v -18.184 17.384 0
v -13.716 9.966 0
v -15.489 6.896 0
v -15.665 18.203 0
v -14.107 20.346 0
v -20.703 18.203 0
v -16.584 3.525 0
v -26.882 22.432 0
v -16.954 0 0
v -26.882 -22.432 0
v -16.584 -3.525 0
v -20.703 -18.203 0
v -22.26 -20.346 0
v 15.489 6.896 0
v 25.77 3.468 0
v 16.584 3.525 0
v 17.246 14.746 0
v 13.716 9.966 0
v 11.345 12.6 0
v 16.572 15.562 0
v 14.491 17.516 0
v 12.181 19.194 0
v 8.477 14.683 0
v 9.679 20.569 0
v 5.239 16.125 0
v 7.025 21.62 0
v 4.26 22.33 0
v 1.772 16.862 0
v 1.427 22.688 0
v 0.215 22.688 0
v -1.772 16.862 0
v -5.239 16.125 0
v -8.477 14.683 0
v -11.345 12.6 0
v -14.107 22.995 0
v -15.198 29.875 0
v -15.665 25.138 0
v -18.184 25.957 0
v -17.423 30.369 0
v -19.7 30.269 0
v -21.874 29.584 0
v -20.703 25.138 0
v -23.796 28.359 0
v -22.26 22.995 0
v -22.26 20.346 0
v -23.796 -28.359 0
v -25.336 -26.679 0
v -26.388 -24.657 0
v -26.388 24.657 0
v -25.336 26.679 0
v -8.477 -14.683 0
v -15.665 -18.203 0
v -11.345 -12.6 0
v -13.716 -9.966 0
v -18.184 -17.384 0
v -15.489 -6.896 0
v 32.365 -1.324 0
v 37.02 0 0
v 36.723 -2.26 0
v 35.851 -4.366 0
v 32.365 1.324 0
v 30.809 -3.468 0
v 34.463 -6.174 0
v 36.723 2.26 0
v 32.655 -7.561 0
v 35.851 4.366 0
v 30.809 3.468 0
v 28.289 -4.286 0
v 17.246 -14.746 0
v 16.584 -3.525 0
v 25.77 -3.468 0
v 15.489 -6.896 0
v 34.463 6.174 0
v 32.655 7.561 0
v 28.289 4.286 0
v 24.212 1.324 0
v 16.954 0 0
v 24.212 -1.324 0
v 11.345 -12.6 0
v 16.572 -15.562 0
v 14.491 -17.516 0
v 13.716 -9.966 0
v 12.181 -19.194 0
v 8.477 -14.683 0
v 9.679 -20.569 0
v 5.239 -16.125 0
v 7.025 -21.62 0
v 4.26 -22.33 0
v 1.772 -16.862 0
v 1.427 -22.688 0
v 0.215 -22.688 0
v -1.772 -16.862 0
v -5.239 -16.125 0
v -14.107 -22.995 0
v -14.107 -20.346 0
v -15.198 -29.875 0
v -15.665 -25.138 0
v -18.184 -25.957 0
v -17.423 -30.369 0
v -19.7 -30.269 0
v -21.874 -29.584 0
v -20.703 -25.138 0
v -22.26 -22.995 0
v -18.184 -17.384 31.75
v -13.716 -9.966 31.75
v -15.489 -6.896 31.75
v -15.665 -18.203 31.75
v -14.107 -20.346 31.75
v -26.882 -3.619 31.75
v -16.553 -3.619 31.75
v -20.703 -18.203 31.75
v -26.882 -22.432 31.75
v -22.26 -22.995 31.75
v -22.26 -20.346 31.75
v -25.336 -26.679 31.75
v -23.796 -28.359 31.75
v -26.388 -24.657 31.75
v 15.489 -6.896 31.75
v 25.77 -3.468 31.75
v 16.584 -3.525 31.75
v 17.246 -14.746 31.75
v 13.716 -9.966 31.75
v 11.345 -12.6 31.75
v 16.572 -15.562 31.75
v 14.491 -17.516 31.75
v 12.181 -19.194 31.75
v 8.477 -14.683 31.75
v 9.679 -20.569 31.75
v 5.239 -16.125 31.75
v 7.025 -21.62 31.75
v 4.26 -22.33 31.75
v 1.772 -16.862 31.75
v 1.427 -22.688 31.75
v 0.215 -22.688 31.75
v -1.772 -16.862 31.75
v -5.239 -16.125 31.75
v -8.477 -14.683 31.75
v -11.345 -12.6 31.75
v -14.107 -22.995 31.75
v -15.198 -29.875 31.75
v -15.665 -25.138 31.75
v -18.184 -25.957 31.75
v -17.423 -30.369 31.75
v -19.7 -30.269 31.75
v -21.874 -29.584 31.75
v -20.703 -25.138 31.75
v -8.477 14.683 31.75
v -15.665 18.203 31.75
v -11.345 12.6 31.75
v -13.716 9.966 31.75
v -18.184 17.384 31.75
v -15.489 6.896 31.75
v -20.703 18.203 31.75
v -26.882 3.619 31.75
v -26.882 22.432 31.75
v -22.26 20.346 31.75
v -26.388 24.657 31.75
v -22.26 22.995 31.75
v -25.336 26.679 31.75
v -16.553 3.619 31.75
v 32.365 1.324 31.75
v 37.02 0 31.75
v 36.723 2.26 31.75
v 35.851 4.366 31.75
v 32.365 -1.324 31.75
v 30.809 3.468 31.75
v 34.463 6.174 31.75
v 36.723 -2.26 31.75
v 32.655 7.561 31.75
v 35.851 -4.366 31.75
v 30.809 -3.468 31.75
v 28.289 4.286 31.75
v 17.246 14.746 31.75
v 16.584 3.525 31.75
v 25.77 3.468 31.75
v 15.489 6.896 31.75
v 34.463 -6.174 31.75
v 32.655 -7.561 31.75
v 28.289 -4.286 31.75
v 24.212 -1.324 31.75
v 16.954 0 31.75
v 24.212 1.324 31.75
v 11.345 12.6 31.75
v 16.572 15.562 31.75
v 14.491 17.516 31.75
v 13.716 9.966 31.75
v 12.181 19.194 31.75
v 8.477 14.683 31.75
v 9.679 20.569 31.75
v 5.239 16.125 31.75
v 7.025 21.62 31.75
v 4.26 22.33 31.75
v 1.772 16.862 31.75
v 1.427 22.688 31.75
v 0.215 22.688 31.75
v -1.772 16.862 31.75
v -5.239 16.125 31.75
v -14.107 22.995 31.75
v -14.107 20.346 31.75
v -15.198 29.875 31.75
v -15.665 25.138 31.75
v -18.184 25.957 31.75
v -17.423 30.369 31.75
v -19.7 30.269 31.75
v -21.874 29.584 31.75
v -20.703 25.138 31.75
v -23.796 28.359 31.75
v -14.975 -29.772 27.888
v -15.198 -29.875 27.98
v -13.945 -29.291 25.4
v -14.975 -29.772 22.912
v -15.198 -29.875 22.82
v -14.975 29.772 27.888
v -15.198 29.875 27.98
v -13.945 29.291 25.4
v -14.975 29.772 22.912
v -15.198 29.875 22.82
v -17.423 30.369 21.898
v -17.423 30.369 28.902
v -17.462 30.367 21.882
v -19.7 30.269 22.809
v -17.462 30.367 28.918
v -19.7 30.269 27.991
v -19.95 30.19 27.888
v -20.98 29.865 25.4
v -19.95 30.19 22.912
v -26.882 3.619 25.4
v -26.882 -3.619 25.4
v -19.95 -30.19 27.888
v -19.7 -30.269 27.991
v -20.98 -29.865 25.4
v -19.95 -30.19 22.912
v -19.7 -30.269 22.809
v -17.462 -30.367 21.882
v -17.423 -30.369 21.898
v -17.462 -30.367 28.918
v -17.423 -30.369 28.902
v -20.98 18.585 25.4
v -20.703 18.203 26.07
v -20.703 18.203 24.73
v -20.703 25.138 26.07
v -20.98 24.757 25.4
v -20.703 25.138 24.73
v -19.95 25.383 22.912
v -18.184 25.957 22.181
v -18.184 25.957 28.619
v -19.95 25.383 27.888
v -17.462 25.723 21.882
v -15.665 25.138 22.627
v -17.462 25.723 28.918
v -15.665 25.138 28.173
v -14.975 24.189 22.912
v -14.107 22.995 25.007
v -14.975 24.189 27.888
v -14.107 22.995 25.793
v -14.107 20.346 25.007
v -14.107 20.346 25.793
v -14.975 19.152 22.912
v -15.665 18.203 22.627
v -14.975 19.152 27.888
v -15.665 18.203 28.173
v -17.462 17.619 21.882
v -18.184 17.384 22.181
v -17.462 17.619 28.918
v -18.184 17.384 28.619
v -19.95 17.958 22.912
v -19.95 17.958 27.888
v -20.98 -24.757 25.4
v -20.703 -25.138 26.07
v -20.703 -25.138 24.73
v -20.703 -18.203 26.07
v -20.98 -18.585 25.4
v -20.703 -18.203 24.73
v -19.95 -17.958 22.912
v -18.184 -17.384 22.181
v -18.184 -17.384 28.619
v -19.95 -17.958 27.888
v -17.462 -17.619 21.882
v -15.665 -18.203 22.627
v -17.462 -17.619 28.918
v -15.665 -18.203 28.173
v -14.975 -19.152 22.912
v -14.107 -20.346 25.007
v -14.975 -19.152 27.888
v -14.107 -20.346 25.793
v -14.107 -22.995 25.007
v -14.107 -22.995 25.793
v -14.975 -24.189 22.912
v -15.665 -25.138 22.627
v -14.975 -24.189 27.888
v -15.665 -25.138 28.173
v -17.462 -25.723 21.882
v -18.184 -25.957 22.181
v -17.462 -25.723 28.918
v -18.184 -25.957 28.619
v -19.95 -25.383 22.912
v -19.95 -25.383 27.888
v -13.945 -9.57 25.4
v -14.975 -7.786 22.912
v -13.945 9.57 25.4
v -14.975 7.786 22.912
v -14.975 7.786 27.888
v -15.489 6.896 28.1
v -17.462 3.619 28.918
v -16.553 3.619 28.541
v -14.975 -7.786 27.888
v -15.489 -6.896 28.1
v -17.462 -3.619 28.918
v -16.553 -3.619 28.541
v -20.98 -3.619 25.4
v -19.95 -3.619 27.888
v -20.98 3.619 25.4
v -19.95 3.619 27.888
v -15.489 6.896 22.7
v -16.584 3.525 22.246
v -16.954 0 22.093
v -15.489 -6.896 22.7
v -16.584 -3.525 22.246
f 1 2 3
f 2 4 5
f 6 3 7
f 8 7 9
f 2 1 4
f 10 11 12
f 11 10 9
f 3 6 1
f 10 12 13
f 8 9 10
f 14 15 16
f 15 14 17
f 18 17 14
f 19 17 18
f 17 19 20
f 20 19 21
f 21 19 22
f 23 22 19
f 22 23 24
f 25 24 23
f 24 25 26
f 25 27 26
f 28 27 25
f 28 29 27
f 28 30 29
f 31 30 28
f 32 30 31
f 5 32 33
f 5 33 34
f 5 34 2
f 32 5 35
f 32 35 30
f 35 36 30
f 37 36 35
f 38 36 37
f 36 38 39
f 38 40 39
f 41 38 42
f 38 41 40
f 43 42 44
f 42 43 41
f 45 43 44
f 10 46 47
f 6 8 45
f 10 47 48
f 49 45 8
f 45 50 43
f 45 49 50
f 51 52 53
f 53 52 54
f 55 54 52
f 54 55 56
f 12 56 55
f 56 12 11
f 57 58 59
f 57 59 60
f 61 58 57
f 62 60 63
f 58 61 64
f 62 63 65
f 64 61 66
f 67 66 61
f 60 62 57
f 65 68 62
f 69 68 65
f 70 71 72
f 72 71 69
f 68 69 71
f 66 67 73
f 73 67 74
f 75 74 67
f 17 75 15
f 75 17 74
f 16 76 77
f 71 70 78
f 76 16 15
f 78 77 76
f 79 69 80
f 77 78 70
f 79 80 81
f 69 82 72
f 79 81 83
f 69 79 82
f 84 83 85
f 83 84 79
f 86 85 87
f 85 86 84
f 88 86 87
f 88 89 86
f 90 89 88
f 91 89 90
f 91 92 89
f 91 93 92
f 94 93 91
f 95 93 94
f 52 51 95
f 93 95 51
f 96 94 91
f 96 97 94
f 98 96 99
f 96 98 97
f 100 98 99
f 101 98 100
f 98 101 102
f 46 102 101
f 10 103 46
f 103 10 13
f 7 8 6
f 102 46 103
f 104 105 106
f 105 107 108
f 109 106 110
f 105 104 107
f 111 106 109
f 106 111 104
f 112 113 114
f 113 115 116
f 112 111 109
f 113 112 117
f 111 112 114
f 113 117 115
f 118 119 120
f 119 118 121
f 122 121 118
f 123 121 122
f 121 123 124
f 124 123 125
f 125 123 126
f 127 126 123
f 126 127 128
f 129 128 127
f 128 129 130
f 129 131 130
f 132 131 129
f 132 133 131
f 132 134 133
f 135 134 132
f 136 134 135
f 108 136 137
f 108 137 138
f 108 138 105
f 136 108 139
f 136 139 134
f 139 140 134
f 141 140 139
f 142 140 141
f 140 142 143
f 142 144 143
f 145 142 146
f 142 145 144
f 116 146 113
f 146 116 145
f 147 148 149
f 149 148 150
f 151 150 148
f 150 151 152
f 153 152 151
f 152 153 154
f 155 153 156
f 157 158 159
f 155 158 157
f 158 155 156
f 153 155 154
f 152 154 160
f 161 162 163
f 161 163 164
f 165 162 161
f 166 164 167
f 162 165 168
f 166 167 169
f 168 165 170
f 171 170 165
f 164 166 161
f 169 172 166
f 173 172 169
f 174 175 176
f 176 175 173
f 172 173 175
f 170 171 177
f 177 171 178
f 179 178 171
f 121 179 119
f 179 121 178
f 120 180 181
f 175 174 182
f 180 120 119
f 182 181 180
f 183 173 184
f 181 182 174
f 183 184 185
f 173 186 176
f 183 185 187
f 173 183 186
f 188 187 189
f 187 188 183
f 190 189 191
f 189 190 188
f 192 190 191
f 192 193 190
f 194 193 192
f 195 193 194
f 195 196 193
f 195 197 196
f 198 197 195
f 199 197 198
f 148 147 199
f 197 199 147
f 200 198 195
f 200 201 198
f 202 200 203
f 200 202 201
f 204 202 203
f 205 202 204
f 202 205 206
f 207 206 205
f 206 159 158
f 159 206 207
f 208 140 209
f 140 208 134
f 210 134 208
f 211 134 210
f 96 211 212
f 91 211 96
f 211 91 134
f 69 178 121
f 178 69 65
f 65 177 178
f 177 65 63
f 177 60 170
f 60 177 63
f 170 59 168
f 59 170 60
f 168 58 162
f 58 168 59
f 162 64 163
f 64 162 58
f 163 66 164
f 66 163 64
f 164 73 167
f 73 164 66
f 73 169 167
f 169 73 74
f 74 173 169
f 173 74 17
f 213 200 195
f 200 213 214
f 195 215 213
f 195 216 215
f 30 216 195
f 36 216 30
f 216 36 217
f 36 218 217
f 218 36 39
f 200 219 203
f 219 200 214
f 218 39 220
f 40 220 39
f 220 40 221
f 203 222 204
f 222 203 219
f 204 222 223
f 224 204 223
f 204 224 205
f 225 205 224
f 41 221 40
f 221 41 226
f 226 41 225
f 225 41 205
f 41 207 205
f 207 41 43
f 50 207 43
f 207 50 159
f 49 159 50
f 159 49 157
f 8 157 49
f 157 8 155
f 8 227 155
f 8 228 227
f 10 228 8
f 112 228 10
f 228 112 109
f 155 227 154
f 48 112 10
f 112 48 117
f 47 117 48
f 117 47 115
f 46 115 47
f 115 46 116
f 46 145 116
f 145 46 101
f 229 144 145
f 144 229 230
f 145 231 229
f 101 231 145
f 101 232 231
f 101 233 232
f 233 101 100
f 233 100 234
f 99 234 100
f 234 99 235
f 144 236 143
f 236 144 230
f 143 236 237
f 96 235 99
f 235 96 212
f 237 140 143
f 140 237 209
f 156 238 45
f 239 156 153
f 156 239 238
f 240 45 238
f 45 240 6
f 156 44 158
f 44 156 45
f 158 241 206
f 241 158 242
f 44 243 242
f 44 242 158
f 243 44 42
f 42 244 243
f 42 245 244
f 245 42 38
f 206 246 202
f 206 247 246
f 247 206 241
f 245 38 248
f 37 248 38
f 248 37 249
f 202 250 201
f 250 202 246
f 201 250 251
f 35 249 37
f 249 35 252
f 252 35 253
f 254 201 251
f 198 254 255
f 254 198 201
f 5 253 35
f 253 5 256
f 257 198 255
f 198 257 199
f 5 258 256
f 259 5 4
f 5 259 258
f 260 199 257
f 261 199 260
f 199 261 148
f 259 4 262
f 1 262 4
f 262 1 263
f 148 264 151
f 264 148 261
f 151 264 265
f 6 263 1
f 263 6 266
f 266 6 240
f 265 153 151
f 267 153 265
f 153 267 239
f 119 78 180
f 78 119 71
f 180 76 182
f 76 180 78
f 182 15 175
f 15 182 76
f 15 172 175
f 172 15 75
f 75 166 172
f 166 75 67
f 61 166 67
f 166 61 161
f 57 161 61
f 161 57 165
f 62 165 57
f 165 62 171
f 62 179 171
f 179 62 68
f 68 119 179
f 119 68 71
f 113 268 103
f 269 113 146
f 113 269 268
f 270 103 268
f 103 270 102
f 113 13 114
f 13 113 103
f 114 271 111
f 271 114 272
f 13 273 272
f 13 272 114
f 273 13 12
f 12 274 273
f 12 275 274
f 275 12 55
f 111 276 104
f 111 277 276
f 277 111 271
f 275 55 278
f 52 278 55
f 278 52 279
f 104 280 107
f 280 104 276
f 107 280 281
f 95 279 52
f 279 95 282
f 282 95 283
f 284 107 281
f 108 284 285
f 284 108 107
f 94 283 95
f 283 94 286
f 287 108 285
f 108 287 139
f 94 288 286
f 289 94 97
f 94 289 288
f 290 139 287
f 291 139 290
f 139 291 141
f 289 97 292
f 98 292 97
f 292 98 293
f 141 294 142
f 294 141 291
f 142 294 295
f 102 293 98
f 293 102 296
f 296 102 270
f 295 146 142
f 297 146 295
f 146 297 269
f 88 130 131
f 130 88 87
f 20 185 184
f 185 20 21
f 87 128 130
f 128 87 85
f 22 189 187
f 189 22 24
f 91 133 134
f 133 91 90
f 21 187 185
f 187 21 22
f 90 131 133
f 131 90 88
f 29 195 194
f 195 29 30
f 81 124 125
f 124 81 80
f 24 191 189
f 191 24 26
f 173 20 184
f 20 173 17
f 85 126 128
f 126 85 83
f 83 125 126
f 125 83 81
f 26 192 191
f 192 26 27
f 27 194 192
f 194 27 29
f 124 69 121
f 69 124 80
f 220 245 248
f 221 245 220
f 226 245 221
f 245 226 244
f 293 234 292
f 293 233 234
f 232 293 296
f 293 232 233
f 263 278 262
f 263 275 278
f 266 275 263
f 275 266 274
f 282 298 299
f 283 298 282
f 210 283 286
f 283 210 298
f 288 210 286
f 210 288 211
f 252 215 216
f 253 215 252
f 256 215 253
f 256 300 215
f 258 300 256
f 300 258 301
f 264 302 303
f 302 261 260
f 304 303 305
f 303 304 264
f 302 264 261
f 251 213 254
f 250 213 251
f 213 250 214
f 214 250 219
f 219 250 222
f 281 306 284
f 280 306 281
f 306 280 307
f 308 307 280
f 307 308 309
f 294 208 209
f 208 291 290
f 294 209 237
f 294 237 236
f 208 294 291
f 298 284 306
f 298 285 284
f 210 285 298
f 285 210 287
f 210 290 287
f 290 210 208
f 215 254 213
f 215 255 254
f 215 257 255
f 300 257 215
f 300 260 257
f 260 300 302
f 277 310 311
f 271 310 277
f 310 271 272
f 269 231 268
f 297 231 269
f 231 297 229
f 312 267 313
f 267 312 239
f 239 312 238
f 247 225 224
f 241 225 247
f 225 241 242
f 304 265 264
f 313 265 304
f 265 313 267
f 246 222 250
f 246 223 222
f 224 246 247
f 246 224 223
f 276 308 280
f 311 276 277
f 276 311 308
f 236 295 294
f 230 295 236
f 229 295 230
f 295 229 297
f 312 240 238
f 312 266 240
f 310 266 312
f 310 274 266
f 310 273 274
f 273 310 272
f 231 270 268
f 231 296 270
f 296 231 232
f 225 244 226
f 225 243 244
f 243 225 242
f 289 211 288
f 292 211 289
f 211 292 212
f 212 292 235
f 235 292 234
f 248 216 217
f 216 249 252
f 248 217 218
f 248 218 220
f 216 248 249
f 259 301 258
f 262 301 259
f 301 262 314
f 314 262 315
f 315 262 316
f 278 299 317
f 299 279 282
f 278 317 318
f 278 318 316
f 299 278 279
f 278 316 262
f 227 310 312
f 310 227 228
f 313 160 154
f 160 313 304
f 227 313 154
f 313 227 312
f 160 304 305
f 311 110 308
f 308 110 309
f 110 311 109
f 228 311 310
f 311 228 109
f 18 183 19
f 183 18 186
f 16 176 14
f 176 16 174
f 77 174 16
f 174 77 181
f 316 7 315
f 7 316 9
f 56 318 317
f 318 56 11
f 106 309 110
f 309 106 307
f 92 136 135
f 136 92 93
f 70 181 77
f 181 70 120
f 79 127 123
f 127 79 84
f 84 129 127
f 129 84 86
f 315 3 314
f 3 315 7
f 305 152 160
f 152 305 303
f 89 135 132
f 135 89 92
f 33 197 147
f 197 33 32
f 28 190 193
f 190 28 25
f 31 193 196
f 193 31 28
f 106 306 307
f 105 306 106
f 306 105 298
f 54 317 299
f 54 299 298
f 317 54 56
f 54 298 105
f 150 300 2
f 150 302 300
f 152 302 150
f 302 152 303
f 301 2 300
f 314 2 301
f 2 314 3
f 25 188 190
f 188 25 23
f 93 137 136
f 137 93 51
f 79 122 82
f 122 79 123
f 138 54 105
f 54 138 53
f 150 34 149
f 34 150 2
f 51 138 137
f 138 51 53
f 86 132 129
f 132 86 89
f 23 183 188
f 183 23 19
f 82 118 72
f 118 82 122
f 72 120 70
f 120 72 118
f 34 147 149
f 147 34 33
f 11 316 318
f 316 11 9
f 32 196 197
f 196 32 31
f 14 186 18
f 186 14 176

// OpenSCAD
// file: Math/Triangles.scad
// Pythagorean Theorem
function pyth_A_B(a,b) = sqrt(pow(a, 2) + pow(b, 2));
function pyth_A_C(a,c) = sqrt(pow(c, 2) - pow(a, 2));
function pyth_B_C(b,c) = sqrt(pow(c, 2) - pow(b, 2));

// Heron's Formula for Triangle Area
function heron_triangle_area(a,b,c) = sqrt(
    ((a+b+c)/2)
    * (((a+b+c)/2) - a)
    * (((a+b+c)/2) - b)
    * (((a+b+c)/2) - c)
  );

function heron_triangle_height(a,b,c) = 2 * heron_triangle_area(a,b,c) / c;
// file: Forend Rail.scad
use <Vitamins/Pipe.scad>;
use <Vitamins/Rod.scad>;

FOREND_RAIL_WALL_DEFAULT = 3/16;
function ForendRailWall() = FOREND_RAIL_WALL_DEFAULT;
function ForendRodAngles(receiver, rod, wall) = [180, 50, -50];
function ForendRailOffset(receiver, rod, wall) = TeeRimRadius(receiver) + wall + RodRadius(rod);

module ForendRods(receiver=Spec_TeeThreeQuarterInch(),
                  rod=Spec_RodFiveSixteenthInch(),
                  wall=ForendRailWall(),
                  clearance=RodClearanceSnug(), angles=ForendRodAngles(), rodFnAngle=90) {

  // Rods
  for (angle = angles)
  rotate([0,0,angle])
  translate([-ForendRailOffset(receiver, rod, wall), 0])
  rotate([0,0,-angle+rodFnAngle])
  Rod2d(rod=rod, clearance=clearance);

  // Debugging aid
  //%TeeRim(receiver);

}

module ForendRail(receiver=Spec_TeeThreeQuarterInch(),
                  barrel=Spec_PipeThreeQuarterInch(),
                  rod=Spec_RodFiveSixteenthInch(),
                  rodHoles=true,
                  wall=ForendRailWall(),
                  clearance=RodClearanceLoose(),
                  angles=ForendRodAngles()) {

  // Rail body
  difference() {
    hull()
    union() {
      for (angle = angles)
      rotate([0,0,angle])
      translate([-ForendRailOffset(receiver, rod, wall), 0])
      circle(r=RodRadius(rod) + wall, $fn=24);
    }

    if (rodHoles)
    ForendRods(receiver, rod, wall, clearance, angles);
  }
}

render(convexity=2)
linear_extrude(height=1)
ForendRail();
// file: Components.scad
include <Math/Triangles.scad>;
include <Vitamins/Angle Stock.scad>;
include <Vitamins/Pipe.scad>;
include <Vitamins/Rod.scad>;

//
// Component Dimensions
//
$fn=60;

// Fascist Settings
overall_length = 26.5;
barrel_length = 18.5;

// Configurable: Wall Thickness
tee_overlap             = 3/16;

rope_od                 = 6/32;

// Configurable: Cylinder
cylinder_spindle_diameter    = 1/8;
cylinder_spindle_wall        = 5/16;
revolver_cylinder_wall       = PipeWall(PipeOneInch);
revolver_cylinder_outer_wall = 3/64;
spindle_overlap              = revolver_cylinder_wall;
revolver_zigzag_pin_diameter = 4/32;
revolver_zigzag_depth        = 3/16;
revolver_shots               = 6;
zigzag_clearance             = 1/64;
chamber_length               = 3;
chamber_seal_overlap         = 1/4;
spindle_collar_diameter      = 0.505;
spindle_collar_height        = 0.27;
actuator_cylinder_clearance  = 0.1;

// Configurable: Vitamin Selection
railRod        = RodFiveSixteenthInch;
breechBushing  = BushingThreeQuarterInch;
barrelPipe     = TubingOnePointOneTwoFive;
stockPipe      = PipeThreeQuarterInch;
receiverTee    = TeeThreeQuarterInch;
gasSealingPipe = PipeOneInch;

// Configurable: Common Settings
bottomRailAngle = 50;

// Configurable: Forend
forend_length = 2;
forend_wall_thickness = 3/16;

// AR15 grip info
grip_width                 = 0.85;
grip_height                = 1.27;


// Calculated: Revolver Cylinder
zigzag_width = revolver_zigzag_pin_diameter + zigzag_clearance*2;
revolver_cylinder_radius = (PipeOuterDiameter(PipeThreeQuarterInch)*1.5)+revolver_cylinder_wall + revolver_cylinder_outer_wall + revolver_zigzag_depth;
revolver_cylinder_od   = revolver_cylinder_radius*2;
cylinder_circumference = 3.14 * pow(revolver_cylinder_od/2, 2);
revolver_center_offset = PipeOuterDiameter(PipeThreeQuarterInch) + revolver_cylinder_wall;
rotation_angle = 360/revolver_shots;
rotation_arc = cylinder_circumference/revolver_shots;
zigzag_height = rotation_arc/2 + revolver_zigzag_pin_diameter*2;
revolver_cylinder_height = zigzag_height + revolver_zigzag_pin_diameter*2.5;
chamber_protrusion = (chamber_length - revolver_cylinder_height)/2;

top_slot_height = revolver_zigzag_pin_diameter*2;
bottom_slot_height = revolver_zigzag_pin_diameter*2 + zigzag_clearance*1.5;
// file: Vitamins/Angle Stock.scad
AngleStockWidth                   = 1;
AngleStockThickness               = 2;
AngleStockTrough                  = 3; // Thickness across the "elbow" of the angle
AngleStockWidthClearanceSnug      = 4;
AngleStockWidthClearanceLoose     = 5;
AngleStockThicknessClearanceSnug  = 6;
AngleStockThicknessClearanceLoose = 7;
AngleStockHeight                  = 8;

// .747
// .744
// .745
//.740


//.749
//.75
AngleStockThreeQuartersByOneEighthInch = [
  [AngleStockWidth,                   0.771],
  [AngleStockThickness,               0.13],
  [AngleStockTrough,                  0.235],
  [AngleStockWidthClearanceSnug,      0.008],
  [AngleStockWidthClearanceLoose,     0.015],
  [AngleStockThicknessClearanceSnug,  0.007],
  [AngleStockThicknessClearanceLoose, 0.008],
  [AngleStockHeight,                  0.574]
];

3_4_angle_stock_width                     = 3/4;
3_4_angle_stock_thickness                 = 0.13;
3_4_angle_stock_trough                    = 0.235;
3_4_angle_stock_height                    = 0.574;
3_4_angle_stock_width_clearance           = 0.008;
3_4_angle_stock_width_clearance_loose     = 0.008;
3_4_angle_stock_thickness_clearance       = 0.005;
3_4_angle_stock_thickness_clearance_loose = 0.007;

// trough is a percentage: 0.0-1.0
module AngleStock(stock=AngleStockThreeQuartersByOneEighthInch, trough=.5, thicknessClearance=AngleStockThicknessClearanceLoose, widthClearance=AngleStockWidthClearanceLoose, length=1) {

  // A percentage of the inner-side length (width - thickness)
  clearThicknessOffset = thicknessClearance != undef ? lookup(thicknessClearance, stock) : 0;
  clearWidthOffset     = widthClearance     != undef ? lookup(widthClearance, stock)     : 0;
  troughOffset         = (trough * (lookup(AngleStockWidth, stock) - lookup(AngleStockThickness, stock))) + lookup(AngleStockThickness, stock);

  linear_extrude(height=length)
  polygon(points=[[0,0],
                  [lookup(AngleStockWidth, stock)+clearWidthOffset,0],                                                         // X-POS Outer Corner
                  [lookup(AngleStockWidth, stock)+clearWidthOffset,lookup(AngleStockThickness, stock)+clearThicknessOffset],   // X-POS Inner Corner
                  [troughOffset,lookup(AngleStockThickness, stock)+clearThicknessOffset],                                      // X-POS Trough
                  [lookup(AngleStockThickness, stock)+clearThicknessOffset,troughOffset],                                      // Y-POS Trough
                  [lookup(AngleStockThickness, stock)+clearThicknessOffset,lookup(AngleStockWidth, stock)+clearWidthOffset],   // Y-POS Inner Corner
                  [0,lookup(AngleStockWidth, stock)+clearWidthOffset],                                                         // Y-POS Outer Corner
          ],
          paths=[[0,1,2,3,4,5,6]]);
}


//#AngleStock();

module 3_4_angle_stock(length=1, cutter=false, loose=false) {
  width_clearance     = loose ? 3_4_angle_stock_width_clearance_loose     : 3_4_angle_stock_width_clearance;
  thickness_clearance = loose ? 3_4_angle_stock_thickness_clearance_loose : 3_4_angle_stock_thickness_clearance;

  union() {
    if (cutter) {
      translate([-width_clearance,-thickness_clearance,0])
      cube([3_4_angle_stock_width     + width_clearance*2,
            3_4_angle_stock_thickness + thickness_clearance*2,
            length]);

      translate([-width_clearance,-thickness_clearance,0])
      cube([3_4_angle_stock_thickness + thickness_clearance*2,
            3_4_angle_stock_width     + width_clearance*2,
            length]);

      translate([3_4_angle_stock_thickness/2, 3_4_angle_stock_thickness/2, 0])
      difference() {
        cube([3_4_angle_stock_trough + thickness_clearance/2,
              3_4_angle_stock_trough + thickness_clearance/2,
              length]);

        translate([3_4_angle_stock_trough + thickness_clearance/2,
                   thickness_clearance/2,
                   -0.1])
        rotate([0,0,45])
        cube([3_4_angle_stock_trough*sqrt(2),
              3_4_angle_stock_trough*sqrt(2),
              length + 0.2]);
      }

    } else {
      cube([3_4_angle_stock_width,3_4_angle_stock_thickness,length]);
      cube([3_4_angle_stock_thickness,3_4_angle_stock_width,length]);

      translate([3_4_angle_stock_thickness, 3_4_angle_stock_thickness, 0])
      difference() {
        cube([3_4_angle_stock_trough, 3_4_angle_stock_trough,length]);

        translate([3_4_angle_stock_trough,0,-0.1])
        rotate([0,0,45])
        cube([3_4_angle_stock_trough*sqrt(2), 3_4_angle_stock_trough*sqrt(2),length + 0.2]);
      }
    }
  };
}
// file: Vitamins/Rod.scad
RodDiameter       = 1;
RodRadius         = 2;
RodClearanceSnug  = 3;
RodClearanceLoose = 4;
RodFn             = 5;

function RodClearanceSnug()  = RodClearanceSnug;
function RodClearanceLoose() = RodClearanceLoose;

RodOneEighthInch = [
  [RodDiameter, 1/8],
  [RodRadius, 1/8/2],
  [RodClearanceSnug, 0.02],
  [RodClearanceLoose, 0.03],
  [RodFn, 8]
];
function Spec_RodOneEighthInch() = RodOneEighthInch;

RodOneQuarterInch = [
  [RodDiameter,       1/4],
  [RodRadius,         1/4/2],
  [RodClearanceSnug,  0.027],
  [RodClearanceLoose, 0.035],
  [RodFn,             8]
];
function Spec_RodOneQuarterInch() = RodOneQuarterInch;

RodFiveSixteenthInch = [
  [RodDiameter,       5/16],
  [RodRadius,         5/16/2],
  [RodClearanceSnug,  0.025],
  [RodClearanceLoose, 0.025],
  [RodFn,             10]
];
function Spec_RodFiveSixteenthInch() = RodFiveSixteenthInch;

RodThreeQuarterInchTubing = [
  [RodDiameter,       0.758],
  [RodRadius,         0.758/2],
  [RodClearanceSnug,  0.023],
  [RodClearanceLoose, 0.029],
  [RodFn,             30]
];
function Spec_RodThreeQuarterInchTubing() = RodThreeQuarterInchTubing;

/**
 * Lookup the diameter of a rod.
 * @param rod The rod to lookup.
 * @param clearance The RodClearance to use.
 */
function RodDiameter(rod=undef, clearance=undef)
           = lookup(RodDiameter, rod)
          + (clearance != undef ? lookup(clearance, rod) : 0);

/**
 * Lookup the radius of a rod.
 * @param rod The rod to lookup.
 * @param clearance The RodClearance to use.
 */
function RodRadius(rod, clearance=undef) = RodDiameter(rod, clearance)/2;

/**
 * Lookup the $fn value for a rod, optionally overriding it
 * @param rod The rod to lookup.
 * @param $fn Override the RodFn. If defined, this will be the result. (convenience arg)
 **/
function RodFn(rod, $fn=undef) = ($fn == undef) ? lookup(RodFn, rod) : $fn;

/**
 * A 2D rod (circle).
 * @param rod The rod to render.
 * @param clearance The RodClearance to use.
 * @param $fn Override the RodFn value of the rod.
 */
module Rod2d(rod=RodOneQuarterInch, clearance=undef, $fn=undef) {
  circle(r=RodRadius(rod, clearance),
         $fn=RodFn(rod, $fn));
}


module Rod(rod=RodOneQuarterInch, length=1, clearance=undef, center=false, $fn=undef) {
  render(convexity=1)
  linear_extrude(height=length, center=center)
  Rod2d(rod, clearance, $fn=$fn);
}

// 1/8" Rod
1_8_rod_d                = 1/8;
1_8_rod_r                = 1_8_rod_d/2;
1_8_rod_clearance        = 0.02;
1_8_rod_clearance_loose  = 0.03;

// 1/4" Rod
1_4_rod_d                = 1/4;
1_4_rod_r                = 1_4_rod_d/2;
1_4_rod_clearance        = 0.01;
1_4_rod_clearance_loose  = 0.015;
1_4_rod_collar_d         = 1/22;
1_4_rod_collar_width     = 0.27;
1_4_rod_collar_clearance = 0.0; // TODO

// 5/16" Rod
5_16_rod_d                = 5/16;
5_16_rod_r                = 5_16_rod_d/2;
5_16_rod_clearance        = 0.02; // TODO
5_16_rod_clearance_loose  = 0.02;

module rod(diameter=1, length=1, clearance=0, clearance_loose=0, loose=false, cutter=false, center=false, $fn=20) {
  clearance = loose ? clearance_loose : clearance;

  if (cutter) {
    cylinder(r=(diameter/2) + (loose ? clearance_loose : clearance), h=length, center=center);
  } else {
    cylinder(r=diameter/2, h=length, center=center);
  }
}

module 1_8_rod(length=1, loose=false, cutter=false, center=false) {
  rod(diameter=1_8_rod_d,
      clearance=1_8_rod_clearance,
      clearance_loose=1_8_rod_clearance_loose,
      length=length,
      cutter=cutter,
      center=center);
}

module 1_4_rod(length=1, loose=false, cutter=false, center=false) {
  rod(diameter=1_4_rod_d,
      clearance=1_4_rod_clearance,
      clearance_loose=1_4_rod_clearance_loose,
      loose=loose,
      length=length,
      cutter=cutter,
      center=center);
}

module 1_4_rod_collar(cutter=false) {
  rod(diameter=1_4_rod_collar_d,
      clearance=1_4_rod_collar_clearance,
      cutter=cutter,
      length=1_4_rod_collar_width);
}

module 5_16_rod(length=1, loose=false, cutter=false, center=false) {
  rod(diameter=5_16_rod_d,
      clearance=5_16_rod_clearance,
      clearance_loose=5_16_rod_clearance_loose,
      length=length,
      cutter=cutter,
      center=center);
}
// main file
include <Vitamins/Pipe.scad>;
include <Vitamins/Rod.scad>;
include <Vitamins/Angle Stock.scad>;
include <Components.scad>;
use     <Forend Rail.scad>;

forendLatchRod = RodOneQuarterInch;
forendLatchPipe = PipeOneInch;

module forend_latch(wall=3/16, latchPipeLength=1, $fn=50,
                     receiverTee=Spec_TeeThreeQuarterInch(), barrelPipe=barrelPipe,
                     latchPipe=forendLatchPipe, latchRod=forendLatchRod) {
  length = latchPipeLength+RodDiameter(latchRod);
  pipe_diameter    = lookup(PipeOuterDiameter, forendLatchPipe);
  pipe_radius      = lookup(PipeOuterDiameter, forendLatchPipe)/2;

  // Latch Pipe
  translate([0,0,-0.5])
  %Pipe(pipe=forendLatchPipe, clearance=PipeClearanceSnug, length=latchPipeLength);

  // Barrel Pipe
  translate([0,0,latchPipeLength +0.1])
  *%Pipe(pipe=barrelPipe, clearance=PipeClearanceSnug, length=10);

  // Receiver Tee
  translate([-TeeCenter(receiverTee),0,-(TeeWidth(receiverTee)/2) - 0.5])
  rotate([0,90,0])
  %Tee(receiverTee);

  // Breech Bushing
  translate([0,0,-0.6])
  %cylinder(r=3/8, h=0.6);

  difference() {
    union() {
      render(convexity=2)
      linear_extrude(height=length)
      ForendRail(wall=wall);

      // Latch Pipe Sleeve
      cylinder(r=pipe_radius + wall, h=length);
      cylinder(r=lookup(TeeRimDiameter, receiverTee)/2 + 4/32, h=length);
    }

    // Barrel Pipe
    translate([0,0,-0.1])
    Pipe(pipe=barrelPipe, length=length + 0.2);

    // Latch Pipe Hole
    translate([0,0,-0.1])
    Pipe(pipe=forendLatchPipe, clearance=PipeClearanceSnug, length=length + 0.2);

    // Latch Rod and Slot
    translate([-PipeOuterRadius(barrelPipe),0,latchPipeLength]) {

      // Latch Rod
      translate([-RodRadius(latchRod),0,0])
      rotate([90,0,0])
      #Rod(rod=latchRod, length=3, clearance=RodClearanceSnug, center=true);

      // Latch Slot
      #translate([-2,-RodRadius(latchRod, RodClearanceLoose),0])
      #cube([2, RodDiameter(latchRod, RodClearanceLoose), RodDiameter(latchRod)*4]);
    }


  }
}

// Scale up to metric for printing
scale([25.4,25.4,25.4]) {
  forend_latch();
}
